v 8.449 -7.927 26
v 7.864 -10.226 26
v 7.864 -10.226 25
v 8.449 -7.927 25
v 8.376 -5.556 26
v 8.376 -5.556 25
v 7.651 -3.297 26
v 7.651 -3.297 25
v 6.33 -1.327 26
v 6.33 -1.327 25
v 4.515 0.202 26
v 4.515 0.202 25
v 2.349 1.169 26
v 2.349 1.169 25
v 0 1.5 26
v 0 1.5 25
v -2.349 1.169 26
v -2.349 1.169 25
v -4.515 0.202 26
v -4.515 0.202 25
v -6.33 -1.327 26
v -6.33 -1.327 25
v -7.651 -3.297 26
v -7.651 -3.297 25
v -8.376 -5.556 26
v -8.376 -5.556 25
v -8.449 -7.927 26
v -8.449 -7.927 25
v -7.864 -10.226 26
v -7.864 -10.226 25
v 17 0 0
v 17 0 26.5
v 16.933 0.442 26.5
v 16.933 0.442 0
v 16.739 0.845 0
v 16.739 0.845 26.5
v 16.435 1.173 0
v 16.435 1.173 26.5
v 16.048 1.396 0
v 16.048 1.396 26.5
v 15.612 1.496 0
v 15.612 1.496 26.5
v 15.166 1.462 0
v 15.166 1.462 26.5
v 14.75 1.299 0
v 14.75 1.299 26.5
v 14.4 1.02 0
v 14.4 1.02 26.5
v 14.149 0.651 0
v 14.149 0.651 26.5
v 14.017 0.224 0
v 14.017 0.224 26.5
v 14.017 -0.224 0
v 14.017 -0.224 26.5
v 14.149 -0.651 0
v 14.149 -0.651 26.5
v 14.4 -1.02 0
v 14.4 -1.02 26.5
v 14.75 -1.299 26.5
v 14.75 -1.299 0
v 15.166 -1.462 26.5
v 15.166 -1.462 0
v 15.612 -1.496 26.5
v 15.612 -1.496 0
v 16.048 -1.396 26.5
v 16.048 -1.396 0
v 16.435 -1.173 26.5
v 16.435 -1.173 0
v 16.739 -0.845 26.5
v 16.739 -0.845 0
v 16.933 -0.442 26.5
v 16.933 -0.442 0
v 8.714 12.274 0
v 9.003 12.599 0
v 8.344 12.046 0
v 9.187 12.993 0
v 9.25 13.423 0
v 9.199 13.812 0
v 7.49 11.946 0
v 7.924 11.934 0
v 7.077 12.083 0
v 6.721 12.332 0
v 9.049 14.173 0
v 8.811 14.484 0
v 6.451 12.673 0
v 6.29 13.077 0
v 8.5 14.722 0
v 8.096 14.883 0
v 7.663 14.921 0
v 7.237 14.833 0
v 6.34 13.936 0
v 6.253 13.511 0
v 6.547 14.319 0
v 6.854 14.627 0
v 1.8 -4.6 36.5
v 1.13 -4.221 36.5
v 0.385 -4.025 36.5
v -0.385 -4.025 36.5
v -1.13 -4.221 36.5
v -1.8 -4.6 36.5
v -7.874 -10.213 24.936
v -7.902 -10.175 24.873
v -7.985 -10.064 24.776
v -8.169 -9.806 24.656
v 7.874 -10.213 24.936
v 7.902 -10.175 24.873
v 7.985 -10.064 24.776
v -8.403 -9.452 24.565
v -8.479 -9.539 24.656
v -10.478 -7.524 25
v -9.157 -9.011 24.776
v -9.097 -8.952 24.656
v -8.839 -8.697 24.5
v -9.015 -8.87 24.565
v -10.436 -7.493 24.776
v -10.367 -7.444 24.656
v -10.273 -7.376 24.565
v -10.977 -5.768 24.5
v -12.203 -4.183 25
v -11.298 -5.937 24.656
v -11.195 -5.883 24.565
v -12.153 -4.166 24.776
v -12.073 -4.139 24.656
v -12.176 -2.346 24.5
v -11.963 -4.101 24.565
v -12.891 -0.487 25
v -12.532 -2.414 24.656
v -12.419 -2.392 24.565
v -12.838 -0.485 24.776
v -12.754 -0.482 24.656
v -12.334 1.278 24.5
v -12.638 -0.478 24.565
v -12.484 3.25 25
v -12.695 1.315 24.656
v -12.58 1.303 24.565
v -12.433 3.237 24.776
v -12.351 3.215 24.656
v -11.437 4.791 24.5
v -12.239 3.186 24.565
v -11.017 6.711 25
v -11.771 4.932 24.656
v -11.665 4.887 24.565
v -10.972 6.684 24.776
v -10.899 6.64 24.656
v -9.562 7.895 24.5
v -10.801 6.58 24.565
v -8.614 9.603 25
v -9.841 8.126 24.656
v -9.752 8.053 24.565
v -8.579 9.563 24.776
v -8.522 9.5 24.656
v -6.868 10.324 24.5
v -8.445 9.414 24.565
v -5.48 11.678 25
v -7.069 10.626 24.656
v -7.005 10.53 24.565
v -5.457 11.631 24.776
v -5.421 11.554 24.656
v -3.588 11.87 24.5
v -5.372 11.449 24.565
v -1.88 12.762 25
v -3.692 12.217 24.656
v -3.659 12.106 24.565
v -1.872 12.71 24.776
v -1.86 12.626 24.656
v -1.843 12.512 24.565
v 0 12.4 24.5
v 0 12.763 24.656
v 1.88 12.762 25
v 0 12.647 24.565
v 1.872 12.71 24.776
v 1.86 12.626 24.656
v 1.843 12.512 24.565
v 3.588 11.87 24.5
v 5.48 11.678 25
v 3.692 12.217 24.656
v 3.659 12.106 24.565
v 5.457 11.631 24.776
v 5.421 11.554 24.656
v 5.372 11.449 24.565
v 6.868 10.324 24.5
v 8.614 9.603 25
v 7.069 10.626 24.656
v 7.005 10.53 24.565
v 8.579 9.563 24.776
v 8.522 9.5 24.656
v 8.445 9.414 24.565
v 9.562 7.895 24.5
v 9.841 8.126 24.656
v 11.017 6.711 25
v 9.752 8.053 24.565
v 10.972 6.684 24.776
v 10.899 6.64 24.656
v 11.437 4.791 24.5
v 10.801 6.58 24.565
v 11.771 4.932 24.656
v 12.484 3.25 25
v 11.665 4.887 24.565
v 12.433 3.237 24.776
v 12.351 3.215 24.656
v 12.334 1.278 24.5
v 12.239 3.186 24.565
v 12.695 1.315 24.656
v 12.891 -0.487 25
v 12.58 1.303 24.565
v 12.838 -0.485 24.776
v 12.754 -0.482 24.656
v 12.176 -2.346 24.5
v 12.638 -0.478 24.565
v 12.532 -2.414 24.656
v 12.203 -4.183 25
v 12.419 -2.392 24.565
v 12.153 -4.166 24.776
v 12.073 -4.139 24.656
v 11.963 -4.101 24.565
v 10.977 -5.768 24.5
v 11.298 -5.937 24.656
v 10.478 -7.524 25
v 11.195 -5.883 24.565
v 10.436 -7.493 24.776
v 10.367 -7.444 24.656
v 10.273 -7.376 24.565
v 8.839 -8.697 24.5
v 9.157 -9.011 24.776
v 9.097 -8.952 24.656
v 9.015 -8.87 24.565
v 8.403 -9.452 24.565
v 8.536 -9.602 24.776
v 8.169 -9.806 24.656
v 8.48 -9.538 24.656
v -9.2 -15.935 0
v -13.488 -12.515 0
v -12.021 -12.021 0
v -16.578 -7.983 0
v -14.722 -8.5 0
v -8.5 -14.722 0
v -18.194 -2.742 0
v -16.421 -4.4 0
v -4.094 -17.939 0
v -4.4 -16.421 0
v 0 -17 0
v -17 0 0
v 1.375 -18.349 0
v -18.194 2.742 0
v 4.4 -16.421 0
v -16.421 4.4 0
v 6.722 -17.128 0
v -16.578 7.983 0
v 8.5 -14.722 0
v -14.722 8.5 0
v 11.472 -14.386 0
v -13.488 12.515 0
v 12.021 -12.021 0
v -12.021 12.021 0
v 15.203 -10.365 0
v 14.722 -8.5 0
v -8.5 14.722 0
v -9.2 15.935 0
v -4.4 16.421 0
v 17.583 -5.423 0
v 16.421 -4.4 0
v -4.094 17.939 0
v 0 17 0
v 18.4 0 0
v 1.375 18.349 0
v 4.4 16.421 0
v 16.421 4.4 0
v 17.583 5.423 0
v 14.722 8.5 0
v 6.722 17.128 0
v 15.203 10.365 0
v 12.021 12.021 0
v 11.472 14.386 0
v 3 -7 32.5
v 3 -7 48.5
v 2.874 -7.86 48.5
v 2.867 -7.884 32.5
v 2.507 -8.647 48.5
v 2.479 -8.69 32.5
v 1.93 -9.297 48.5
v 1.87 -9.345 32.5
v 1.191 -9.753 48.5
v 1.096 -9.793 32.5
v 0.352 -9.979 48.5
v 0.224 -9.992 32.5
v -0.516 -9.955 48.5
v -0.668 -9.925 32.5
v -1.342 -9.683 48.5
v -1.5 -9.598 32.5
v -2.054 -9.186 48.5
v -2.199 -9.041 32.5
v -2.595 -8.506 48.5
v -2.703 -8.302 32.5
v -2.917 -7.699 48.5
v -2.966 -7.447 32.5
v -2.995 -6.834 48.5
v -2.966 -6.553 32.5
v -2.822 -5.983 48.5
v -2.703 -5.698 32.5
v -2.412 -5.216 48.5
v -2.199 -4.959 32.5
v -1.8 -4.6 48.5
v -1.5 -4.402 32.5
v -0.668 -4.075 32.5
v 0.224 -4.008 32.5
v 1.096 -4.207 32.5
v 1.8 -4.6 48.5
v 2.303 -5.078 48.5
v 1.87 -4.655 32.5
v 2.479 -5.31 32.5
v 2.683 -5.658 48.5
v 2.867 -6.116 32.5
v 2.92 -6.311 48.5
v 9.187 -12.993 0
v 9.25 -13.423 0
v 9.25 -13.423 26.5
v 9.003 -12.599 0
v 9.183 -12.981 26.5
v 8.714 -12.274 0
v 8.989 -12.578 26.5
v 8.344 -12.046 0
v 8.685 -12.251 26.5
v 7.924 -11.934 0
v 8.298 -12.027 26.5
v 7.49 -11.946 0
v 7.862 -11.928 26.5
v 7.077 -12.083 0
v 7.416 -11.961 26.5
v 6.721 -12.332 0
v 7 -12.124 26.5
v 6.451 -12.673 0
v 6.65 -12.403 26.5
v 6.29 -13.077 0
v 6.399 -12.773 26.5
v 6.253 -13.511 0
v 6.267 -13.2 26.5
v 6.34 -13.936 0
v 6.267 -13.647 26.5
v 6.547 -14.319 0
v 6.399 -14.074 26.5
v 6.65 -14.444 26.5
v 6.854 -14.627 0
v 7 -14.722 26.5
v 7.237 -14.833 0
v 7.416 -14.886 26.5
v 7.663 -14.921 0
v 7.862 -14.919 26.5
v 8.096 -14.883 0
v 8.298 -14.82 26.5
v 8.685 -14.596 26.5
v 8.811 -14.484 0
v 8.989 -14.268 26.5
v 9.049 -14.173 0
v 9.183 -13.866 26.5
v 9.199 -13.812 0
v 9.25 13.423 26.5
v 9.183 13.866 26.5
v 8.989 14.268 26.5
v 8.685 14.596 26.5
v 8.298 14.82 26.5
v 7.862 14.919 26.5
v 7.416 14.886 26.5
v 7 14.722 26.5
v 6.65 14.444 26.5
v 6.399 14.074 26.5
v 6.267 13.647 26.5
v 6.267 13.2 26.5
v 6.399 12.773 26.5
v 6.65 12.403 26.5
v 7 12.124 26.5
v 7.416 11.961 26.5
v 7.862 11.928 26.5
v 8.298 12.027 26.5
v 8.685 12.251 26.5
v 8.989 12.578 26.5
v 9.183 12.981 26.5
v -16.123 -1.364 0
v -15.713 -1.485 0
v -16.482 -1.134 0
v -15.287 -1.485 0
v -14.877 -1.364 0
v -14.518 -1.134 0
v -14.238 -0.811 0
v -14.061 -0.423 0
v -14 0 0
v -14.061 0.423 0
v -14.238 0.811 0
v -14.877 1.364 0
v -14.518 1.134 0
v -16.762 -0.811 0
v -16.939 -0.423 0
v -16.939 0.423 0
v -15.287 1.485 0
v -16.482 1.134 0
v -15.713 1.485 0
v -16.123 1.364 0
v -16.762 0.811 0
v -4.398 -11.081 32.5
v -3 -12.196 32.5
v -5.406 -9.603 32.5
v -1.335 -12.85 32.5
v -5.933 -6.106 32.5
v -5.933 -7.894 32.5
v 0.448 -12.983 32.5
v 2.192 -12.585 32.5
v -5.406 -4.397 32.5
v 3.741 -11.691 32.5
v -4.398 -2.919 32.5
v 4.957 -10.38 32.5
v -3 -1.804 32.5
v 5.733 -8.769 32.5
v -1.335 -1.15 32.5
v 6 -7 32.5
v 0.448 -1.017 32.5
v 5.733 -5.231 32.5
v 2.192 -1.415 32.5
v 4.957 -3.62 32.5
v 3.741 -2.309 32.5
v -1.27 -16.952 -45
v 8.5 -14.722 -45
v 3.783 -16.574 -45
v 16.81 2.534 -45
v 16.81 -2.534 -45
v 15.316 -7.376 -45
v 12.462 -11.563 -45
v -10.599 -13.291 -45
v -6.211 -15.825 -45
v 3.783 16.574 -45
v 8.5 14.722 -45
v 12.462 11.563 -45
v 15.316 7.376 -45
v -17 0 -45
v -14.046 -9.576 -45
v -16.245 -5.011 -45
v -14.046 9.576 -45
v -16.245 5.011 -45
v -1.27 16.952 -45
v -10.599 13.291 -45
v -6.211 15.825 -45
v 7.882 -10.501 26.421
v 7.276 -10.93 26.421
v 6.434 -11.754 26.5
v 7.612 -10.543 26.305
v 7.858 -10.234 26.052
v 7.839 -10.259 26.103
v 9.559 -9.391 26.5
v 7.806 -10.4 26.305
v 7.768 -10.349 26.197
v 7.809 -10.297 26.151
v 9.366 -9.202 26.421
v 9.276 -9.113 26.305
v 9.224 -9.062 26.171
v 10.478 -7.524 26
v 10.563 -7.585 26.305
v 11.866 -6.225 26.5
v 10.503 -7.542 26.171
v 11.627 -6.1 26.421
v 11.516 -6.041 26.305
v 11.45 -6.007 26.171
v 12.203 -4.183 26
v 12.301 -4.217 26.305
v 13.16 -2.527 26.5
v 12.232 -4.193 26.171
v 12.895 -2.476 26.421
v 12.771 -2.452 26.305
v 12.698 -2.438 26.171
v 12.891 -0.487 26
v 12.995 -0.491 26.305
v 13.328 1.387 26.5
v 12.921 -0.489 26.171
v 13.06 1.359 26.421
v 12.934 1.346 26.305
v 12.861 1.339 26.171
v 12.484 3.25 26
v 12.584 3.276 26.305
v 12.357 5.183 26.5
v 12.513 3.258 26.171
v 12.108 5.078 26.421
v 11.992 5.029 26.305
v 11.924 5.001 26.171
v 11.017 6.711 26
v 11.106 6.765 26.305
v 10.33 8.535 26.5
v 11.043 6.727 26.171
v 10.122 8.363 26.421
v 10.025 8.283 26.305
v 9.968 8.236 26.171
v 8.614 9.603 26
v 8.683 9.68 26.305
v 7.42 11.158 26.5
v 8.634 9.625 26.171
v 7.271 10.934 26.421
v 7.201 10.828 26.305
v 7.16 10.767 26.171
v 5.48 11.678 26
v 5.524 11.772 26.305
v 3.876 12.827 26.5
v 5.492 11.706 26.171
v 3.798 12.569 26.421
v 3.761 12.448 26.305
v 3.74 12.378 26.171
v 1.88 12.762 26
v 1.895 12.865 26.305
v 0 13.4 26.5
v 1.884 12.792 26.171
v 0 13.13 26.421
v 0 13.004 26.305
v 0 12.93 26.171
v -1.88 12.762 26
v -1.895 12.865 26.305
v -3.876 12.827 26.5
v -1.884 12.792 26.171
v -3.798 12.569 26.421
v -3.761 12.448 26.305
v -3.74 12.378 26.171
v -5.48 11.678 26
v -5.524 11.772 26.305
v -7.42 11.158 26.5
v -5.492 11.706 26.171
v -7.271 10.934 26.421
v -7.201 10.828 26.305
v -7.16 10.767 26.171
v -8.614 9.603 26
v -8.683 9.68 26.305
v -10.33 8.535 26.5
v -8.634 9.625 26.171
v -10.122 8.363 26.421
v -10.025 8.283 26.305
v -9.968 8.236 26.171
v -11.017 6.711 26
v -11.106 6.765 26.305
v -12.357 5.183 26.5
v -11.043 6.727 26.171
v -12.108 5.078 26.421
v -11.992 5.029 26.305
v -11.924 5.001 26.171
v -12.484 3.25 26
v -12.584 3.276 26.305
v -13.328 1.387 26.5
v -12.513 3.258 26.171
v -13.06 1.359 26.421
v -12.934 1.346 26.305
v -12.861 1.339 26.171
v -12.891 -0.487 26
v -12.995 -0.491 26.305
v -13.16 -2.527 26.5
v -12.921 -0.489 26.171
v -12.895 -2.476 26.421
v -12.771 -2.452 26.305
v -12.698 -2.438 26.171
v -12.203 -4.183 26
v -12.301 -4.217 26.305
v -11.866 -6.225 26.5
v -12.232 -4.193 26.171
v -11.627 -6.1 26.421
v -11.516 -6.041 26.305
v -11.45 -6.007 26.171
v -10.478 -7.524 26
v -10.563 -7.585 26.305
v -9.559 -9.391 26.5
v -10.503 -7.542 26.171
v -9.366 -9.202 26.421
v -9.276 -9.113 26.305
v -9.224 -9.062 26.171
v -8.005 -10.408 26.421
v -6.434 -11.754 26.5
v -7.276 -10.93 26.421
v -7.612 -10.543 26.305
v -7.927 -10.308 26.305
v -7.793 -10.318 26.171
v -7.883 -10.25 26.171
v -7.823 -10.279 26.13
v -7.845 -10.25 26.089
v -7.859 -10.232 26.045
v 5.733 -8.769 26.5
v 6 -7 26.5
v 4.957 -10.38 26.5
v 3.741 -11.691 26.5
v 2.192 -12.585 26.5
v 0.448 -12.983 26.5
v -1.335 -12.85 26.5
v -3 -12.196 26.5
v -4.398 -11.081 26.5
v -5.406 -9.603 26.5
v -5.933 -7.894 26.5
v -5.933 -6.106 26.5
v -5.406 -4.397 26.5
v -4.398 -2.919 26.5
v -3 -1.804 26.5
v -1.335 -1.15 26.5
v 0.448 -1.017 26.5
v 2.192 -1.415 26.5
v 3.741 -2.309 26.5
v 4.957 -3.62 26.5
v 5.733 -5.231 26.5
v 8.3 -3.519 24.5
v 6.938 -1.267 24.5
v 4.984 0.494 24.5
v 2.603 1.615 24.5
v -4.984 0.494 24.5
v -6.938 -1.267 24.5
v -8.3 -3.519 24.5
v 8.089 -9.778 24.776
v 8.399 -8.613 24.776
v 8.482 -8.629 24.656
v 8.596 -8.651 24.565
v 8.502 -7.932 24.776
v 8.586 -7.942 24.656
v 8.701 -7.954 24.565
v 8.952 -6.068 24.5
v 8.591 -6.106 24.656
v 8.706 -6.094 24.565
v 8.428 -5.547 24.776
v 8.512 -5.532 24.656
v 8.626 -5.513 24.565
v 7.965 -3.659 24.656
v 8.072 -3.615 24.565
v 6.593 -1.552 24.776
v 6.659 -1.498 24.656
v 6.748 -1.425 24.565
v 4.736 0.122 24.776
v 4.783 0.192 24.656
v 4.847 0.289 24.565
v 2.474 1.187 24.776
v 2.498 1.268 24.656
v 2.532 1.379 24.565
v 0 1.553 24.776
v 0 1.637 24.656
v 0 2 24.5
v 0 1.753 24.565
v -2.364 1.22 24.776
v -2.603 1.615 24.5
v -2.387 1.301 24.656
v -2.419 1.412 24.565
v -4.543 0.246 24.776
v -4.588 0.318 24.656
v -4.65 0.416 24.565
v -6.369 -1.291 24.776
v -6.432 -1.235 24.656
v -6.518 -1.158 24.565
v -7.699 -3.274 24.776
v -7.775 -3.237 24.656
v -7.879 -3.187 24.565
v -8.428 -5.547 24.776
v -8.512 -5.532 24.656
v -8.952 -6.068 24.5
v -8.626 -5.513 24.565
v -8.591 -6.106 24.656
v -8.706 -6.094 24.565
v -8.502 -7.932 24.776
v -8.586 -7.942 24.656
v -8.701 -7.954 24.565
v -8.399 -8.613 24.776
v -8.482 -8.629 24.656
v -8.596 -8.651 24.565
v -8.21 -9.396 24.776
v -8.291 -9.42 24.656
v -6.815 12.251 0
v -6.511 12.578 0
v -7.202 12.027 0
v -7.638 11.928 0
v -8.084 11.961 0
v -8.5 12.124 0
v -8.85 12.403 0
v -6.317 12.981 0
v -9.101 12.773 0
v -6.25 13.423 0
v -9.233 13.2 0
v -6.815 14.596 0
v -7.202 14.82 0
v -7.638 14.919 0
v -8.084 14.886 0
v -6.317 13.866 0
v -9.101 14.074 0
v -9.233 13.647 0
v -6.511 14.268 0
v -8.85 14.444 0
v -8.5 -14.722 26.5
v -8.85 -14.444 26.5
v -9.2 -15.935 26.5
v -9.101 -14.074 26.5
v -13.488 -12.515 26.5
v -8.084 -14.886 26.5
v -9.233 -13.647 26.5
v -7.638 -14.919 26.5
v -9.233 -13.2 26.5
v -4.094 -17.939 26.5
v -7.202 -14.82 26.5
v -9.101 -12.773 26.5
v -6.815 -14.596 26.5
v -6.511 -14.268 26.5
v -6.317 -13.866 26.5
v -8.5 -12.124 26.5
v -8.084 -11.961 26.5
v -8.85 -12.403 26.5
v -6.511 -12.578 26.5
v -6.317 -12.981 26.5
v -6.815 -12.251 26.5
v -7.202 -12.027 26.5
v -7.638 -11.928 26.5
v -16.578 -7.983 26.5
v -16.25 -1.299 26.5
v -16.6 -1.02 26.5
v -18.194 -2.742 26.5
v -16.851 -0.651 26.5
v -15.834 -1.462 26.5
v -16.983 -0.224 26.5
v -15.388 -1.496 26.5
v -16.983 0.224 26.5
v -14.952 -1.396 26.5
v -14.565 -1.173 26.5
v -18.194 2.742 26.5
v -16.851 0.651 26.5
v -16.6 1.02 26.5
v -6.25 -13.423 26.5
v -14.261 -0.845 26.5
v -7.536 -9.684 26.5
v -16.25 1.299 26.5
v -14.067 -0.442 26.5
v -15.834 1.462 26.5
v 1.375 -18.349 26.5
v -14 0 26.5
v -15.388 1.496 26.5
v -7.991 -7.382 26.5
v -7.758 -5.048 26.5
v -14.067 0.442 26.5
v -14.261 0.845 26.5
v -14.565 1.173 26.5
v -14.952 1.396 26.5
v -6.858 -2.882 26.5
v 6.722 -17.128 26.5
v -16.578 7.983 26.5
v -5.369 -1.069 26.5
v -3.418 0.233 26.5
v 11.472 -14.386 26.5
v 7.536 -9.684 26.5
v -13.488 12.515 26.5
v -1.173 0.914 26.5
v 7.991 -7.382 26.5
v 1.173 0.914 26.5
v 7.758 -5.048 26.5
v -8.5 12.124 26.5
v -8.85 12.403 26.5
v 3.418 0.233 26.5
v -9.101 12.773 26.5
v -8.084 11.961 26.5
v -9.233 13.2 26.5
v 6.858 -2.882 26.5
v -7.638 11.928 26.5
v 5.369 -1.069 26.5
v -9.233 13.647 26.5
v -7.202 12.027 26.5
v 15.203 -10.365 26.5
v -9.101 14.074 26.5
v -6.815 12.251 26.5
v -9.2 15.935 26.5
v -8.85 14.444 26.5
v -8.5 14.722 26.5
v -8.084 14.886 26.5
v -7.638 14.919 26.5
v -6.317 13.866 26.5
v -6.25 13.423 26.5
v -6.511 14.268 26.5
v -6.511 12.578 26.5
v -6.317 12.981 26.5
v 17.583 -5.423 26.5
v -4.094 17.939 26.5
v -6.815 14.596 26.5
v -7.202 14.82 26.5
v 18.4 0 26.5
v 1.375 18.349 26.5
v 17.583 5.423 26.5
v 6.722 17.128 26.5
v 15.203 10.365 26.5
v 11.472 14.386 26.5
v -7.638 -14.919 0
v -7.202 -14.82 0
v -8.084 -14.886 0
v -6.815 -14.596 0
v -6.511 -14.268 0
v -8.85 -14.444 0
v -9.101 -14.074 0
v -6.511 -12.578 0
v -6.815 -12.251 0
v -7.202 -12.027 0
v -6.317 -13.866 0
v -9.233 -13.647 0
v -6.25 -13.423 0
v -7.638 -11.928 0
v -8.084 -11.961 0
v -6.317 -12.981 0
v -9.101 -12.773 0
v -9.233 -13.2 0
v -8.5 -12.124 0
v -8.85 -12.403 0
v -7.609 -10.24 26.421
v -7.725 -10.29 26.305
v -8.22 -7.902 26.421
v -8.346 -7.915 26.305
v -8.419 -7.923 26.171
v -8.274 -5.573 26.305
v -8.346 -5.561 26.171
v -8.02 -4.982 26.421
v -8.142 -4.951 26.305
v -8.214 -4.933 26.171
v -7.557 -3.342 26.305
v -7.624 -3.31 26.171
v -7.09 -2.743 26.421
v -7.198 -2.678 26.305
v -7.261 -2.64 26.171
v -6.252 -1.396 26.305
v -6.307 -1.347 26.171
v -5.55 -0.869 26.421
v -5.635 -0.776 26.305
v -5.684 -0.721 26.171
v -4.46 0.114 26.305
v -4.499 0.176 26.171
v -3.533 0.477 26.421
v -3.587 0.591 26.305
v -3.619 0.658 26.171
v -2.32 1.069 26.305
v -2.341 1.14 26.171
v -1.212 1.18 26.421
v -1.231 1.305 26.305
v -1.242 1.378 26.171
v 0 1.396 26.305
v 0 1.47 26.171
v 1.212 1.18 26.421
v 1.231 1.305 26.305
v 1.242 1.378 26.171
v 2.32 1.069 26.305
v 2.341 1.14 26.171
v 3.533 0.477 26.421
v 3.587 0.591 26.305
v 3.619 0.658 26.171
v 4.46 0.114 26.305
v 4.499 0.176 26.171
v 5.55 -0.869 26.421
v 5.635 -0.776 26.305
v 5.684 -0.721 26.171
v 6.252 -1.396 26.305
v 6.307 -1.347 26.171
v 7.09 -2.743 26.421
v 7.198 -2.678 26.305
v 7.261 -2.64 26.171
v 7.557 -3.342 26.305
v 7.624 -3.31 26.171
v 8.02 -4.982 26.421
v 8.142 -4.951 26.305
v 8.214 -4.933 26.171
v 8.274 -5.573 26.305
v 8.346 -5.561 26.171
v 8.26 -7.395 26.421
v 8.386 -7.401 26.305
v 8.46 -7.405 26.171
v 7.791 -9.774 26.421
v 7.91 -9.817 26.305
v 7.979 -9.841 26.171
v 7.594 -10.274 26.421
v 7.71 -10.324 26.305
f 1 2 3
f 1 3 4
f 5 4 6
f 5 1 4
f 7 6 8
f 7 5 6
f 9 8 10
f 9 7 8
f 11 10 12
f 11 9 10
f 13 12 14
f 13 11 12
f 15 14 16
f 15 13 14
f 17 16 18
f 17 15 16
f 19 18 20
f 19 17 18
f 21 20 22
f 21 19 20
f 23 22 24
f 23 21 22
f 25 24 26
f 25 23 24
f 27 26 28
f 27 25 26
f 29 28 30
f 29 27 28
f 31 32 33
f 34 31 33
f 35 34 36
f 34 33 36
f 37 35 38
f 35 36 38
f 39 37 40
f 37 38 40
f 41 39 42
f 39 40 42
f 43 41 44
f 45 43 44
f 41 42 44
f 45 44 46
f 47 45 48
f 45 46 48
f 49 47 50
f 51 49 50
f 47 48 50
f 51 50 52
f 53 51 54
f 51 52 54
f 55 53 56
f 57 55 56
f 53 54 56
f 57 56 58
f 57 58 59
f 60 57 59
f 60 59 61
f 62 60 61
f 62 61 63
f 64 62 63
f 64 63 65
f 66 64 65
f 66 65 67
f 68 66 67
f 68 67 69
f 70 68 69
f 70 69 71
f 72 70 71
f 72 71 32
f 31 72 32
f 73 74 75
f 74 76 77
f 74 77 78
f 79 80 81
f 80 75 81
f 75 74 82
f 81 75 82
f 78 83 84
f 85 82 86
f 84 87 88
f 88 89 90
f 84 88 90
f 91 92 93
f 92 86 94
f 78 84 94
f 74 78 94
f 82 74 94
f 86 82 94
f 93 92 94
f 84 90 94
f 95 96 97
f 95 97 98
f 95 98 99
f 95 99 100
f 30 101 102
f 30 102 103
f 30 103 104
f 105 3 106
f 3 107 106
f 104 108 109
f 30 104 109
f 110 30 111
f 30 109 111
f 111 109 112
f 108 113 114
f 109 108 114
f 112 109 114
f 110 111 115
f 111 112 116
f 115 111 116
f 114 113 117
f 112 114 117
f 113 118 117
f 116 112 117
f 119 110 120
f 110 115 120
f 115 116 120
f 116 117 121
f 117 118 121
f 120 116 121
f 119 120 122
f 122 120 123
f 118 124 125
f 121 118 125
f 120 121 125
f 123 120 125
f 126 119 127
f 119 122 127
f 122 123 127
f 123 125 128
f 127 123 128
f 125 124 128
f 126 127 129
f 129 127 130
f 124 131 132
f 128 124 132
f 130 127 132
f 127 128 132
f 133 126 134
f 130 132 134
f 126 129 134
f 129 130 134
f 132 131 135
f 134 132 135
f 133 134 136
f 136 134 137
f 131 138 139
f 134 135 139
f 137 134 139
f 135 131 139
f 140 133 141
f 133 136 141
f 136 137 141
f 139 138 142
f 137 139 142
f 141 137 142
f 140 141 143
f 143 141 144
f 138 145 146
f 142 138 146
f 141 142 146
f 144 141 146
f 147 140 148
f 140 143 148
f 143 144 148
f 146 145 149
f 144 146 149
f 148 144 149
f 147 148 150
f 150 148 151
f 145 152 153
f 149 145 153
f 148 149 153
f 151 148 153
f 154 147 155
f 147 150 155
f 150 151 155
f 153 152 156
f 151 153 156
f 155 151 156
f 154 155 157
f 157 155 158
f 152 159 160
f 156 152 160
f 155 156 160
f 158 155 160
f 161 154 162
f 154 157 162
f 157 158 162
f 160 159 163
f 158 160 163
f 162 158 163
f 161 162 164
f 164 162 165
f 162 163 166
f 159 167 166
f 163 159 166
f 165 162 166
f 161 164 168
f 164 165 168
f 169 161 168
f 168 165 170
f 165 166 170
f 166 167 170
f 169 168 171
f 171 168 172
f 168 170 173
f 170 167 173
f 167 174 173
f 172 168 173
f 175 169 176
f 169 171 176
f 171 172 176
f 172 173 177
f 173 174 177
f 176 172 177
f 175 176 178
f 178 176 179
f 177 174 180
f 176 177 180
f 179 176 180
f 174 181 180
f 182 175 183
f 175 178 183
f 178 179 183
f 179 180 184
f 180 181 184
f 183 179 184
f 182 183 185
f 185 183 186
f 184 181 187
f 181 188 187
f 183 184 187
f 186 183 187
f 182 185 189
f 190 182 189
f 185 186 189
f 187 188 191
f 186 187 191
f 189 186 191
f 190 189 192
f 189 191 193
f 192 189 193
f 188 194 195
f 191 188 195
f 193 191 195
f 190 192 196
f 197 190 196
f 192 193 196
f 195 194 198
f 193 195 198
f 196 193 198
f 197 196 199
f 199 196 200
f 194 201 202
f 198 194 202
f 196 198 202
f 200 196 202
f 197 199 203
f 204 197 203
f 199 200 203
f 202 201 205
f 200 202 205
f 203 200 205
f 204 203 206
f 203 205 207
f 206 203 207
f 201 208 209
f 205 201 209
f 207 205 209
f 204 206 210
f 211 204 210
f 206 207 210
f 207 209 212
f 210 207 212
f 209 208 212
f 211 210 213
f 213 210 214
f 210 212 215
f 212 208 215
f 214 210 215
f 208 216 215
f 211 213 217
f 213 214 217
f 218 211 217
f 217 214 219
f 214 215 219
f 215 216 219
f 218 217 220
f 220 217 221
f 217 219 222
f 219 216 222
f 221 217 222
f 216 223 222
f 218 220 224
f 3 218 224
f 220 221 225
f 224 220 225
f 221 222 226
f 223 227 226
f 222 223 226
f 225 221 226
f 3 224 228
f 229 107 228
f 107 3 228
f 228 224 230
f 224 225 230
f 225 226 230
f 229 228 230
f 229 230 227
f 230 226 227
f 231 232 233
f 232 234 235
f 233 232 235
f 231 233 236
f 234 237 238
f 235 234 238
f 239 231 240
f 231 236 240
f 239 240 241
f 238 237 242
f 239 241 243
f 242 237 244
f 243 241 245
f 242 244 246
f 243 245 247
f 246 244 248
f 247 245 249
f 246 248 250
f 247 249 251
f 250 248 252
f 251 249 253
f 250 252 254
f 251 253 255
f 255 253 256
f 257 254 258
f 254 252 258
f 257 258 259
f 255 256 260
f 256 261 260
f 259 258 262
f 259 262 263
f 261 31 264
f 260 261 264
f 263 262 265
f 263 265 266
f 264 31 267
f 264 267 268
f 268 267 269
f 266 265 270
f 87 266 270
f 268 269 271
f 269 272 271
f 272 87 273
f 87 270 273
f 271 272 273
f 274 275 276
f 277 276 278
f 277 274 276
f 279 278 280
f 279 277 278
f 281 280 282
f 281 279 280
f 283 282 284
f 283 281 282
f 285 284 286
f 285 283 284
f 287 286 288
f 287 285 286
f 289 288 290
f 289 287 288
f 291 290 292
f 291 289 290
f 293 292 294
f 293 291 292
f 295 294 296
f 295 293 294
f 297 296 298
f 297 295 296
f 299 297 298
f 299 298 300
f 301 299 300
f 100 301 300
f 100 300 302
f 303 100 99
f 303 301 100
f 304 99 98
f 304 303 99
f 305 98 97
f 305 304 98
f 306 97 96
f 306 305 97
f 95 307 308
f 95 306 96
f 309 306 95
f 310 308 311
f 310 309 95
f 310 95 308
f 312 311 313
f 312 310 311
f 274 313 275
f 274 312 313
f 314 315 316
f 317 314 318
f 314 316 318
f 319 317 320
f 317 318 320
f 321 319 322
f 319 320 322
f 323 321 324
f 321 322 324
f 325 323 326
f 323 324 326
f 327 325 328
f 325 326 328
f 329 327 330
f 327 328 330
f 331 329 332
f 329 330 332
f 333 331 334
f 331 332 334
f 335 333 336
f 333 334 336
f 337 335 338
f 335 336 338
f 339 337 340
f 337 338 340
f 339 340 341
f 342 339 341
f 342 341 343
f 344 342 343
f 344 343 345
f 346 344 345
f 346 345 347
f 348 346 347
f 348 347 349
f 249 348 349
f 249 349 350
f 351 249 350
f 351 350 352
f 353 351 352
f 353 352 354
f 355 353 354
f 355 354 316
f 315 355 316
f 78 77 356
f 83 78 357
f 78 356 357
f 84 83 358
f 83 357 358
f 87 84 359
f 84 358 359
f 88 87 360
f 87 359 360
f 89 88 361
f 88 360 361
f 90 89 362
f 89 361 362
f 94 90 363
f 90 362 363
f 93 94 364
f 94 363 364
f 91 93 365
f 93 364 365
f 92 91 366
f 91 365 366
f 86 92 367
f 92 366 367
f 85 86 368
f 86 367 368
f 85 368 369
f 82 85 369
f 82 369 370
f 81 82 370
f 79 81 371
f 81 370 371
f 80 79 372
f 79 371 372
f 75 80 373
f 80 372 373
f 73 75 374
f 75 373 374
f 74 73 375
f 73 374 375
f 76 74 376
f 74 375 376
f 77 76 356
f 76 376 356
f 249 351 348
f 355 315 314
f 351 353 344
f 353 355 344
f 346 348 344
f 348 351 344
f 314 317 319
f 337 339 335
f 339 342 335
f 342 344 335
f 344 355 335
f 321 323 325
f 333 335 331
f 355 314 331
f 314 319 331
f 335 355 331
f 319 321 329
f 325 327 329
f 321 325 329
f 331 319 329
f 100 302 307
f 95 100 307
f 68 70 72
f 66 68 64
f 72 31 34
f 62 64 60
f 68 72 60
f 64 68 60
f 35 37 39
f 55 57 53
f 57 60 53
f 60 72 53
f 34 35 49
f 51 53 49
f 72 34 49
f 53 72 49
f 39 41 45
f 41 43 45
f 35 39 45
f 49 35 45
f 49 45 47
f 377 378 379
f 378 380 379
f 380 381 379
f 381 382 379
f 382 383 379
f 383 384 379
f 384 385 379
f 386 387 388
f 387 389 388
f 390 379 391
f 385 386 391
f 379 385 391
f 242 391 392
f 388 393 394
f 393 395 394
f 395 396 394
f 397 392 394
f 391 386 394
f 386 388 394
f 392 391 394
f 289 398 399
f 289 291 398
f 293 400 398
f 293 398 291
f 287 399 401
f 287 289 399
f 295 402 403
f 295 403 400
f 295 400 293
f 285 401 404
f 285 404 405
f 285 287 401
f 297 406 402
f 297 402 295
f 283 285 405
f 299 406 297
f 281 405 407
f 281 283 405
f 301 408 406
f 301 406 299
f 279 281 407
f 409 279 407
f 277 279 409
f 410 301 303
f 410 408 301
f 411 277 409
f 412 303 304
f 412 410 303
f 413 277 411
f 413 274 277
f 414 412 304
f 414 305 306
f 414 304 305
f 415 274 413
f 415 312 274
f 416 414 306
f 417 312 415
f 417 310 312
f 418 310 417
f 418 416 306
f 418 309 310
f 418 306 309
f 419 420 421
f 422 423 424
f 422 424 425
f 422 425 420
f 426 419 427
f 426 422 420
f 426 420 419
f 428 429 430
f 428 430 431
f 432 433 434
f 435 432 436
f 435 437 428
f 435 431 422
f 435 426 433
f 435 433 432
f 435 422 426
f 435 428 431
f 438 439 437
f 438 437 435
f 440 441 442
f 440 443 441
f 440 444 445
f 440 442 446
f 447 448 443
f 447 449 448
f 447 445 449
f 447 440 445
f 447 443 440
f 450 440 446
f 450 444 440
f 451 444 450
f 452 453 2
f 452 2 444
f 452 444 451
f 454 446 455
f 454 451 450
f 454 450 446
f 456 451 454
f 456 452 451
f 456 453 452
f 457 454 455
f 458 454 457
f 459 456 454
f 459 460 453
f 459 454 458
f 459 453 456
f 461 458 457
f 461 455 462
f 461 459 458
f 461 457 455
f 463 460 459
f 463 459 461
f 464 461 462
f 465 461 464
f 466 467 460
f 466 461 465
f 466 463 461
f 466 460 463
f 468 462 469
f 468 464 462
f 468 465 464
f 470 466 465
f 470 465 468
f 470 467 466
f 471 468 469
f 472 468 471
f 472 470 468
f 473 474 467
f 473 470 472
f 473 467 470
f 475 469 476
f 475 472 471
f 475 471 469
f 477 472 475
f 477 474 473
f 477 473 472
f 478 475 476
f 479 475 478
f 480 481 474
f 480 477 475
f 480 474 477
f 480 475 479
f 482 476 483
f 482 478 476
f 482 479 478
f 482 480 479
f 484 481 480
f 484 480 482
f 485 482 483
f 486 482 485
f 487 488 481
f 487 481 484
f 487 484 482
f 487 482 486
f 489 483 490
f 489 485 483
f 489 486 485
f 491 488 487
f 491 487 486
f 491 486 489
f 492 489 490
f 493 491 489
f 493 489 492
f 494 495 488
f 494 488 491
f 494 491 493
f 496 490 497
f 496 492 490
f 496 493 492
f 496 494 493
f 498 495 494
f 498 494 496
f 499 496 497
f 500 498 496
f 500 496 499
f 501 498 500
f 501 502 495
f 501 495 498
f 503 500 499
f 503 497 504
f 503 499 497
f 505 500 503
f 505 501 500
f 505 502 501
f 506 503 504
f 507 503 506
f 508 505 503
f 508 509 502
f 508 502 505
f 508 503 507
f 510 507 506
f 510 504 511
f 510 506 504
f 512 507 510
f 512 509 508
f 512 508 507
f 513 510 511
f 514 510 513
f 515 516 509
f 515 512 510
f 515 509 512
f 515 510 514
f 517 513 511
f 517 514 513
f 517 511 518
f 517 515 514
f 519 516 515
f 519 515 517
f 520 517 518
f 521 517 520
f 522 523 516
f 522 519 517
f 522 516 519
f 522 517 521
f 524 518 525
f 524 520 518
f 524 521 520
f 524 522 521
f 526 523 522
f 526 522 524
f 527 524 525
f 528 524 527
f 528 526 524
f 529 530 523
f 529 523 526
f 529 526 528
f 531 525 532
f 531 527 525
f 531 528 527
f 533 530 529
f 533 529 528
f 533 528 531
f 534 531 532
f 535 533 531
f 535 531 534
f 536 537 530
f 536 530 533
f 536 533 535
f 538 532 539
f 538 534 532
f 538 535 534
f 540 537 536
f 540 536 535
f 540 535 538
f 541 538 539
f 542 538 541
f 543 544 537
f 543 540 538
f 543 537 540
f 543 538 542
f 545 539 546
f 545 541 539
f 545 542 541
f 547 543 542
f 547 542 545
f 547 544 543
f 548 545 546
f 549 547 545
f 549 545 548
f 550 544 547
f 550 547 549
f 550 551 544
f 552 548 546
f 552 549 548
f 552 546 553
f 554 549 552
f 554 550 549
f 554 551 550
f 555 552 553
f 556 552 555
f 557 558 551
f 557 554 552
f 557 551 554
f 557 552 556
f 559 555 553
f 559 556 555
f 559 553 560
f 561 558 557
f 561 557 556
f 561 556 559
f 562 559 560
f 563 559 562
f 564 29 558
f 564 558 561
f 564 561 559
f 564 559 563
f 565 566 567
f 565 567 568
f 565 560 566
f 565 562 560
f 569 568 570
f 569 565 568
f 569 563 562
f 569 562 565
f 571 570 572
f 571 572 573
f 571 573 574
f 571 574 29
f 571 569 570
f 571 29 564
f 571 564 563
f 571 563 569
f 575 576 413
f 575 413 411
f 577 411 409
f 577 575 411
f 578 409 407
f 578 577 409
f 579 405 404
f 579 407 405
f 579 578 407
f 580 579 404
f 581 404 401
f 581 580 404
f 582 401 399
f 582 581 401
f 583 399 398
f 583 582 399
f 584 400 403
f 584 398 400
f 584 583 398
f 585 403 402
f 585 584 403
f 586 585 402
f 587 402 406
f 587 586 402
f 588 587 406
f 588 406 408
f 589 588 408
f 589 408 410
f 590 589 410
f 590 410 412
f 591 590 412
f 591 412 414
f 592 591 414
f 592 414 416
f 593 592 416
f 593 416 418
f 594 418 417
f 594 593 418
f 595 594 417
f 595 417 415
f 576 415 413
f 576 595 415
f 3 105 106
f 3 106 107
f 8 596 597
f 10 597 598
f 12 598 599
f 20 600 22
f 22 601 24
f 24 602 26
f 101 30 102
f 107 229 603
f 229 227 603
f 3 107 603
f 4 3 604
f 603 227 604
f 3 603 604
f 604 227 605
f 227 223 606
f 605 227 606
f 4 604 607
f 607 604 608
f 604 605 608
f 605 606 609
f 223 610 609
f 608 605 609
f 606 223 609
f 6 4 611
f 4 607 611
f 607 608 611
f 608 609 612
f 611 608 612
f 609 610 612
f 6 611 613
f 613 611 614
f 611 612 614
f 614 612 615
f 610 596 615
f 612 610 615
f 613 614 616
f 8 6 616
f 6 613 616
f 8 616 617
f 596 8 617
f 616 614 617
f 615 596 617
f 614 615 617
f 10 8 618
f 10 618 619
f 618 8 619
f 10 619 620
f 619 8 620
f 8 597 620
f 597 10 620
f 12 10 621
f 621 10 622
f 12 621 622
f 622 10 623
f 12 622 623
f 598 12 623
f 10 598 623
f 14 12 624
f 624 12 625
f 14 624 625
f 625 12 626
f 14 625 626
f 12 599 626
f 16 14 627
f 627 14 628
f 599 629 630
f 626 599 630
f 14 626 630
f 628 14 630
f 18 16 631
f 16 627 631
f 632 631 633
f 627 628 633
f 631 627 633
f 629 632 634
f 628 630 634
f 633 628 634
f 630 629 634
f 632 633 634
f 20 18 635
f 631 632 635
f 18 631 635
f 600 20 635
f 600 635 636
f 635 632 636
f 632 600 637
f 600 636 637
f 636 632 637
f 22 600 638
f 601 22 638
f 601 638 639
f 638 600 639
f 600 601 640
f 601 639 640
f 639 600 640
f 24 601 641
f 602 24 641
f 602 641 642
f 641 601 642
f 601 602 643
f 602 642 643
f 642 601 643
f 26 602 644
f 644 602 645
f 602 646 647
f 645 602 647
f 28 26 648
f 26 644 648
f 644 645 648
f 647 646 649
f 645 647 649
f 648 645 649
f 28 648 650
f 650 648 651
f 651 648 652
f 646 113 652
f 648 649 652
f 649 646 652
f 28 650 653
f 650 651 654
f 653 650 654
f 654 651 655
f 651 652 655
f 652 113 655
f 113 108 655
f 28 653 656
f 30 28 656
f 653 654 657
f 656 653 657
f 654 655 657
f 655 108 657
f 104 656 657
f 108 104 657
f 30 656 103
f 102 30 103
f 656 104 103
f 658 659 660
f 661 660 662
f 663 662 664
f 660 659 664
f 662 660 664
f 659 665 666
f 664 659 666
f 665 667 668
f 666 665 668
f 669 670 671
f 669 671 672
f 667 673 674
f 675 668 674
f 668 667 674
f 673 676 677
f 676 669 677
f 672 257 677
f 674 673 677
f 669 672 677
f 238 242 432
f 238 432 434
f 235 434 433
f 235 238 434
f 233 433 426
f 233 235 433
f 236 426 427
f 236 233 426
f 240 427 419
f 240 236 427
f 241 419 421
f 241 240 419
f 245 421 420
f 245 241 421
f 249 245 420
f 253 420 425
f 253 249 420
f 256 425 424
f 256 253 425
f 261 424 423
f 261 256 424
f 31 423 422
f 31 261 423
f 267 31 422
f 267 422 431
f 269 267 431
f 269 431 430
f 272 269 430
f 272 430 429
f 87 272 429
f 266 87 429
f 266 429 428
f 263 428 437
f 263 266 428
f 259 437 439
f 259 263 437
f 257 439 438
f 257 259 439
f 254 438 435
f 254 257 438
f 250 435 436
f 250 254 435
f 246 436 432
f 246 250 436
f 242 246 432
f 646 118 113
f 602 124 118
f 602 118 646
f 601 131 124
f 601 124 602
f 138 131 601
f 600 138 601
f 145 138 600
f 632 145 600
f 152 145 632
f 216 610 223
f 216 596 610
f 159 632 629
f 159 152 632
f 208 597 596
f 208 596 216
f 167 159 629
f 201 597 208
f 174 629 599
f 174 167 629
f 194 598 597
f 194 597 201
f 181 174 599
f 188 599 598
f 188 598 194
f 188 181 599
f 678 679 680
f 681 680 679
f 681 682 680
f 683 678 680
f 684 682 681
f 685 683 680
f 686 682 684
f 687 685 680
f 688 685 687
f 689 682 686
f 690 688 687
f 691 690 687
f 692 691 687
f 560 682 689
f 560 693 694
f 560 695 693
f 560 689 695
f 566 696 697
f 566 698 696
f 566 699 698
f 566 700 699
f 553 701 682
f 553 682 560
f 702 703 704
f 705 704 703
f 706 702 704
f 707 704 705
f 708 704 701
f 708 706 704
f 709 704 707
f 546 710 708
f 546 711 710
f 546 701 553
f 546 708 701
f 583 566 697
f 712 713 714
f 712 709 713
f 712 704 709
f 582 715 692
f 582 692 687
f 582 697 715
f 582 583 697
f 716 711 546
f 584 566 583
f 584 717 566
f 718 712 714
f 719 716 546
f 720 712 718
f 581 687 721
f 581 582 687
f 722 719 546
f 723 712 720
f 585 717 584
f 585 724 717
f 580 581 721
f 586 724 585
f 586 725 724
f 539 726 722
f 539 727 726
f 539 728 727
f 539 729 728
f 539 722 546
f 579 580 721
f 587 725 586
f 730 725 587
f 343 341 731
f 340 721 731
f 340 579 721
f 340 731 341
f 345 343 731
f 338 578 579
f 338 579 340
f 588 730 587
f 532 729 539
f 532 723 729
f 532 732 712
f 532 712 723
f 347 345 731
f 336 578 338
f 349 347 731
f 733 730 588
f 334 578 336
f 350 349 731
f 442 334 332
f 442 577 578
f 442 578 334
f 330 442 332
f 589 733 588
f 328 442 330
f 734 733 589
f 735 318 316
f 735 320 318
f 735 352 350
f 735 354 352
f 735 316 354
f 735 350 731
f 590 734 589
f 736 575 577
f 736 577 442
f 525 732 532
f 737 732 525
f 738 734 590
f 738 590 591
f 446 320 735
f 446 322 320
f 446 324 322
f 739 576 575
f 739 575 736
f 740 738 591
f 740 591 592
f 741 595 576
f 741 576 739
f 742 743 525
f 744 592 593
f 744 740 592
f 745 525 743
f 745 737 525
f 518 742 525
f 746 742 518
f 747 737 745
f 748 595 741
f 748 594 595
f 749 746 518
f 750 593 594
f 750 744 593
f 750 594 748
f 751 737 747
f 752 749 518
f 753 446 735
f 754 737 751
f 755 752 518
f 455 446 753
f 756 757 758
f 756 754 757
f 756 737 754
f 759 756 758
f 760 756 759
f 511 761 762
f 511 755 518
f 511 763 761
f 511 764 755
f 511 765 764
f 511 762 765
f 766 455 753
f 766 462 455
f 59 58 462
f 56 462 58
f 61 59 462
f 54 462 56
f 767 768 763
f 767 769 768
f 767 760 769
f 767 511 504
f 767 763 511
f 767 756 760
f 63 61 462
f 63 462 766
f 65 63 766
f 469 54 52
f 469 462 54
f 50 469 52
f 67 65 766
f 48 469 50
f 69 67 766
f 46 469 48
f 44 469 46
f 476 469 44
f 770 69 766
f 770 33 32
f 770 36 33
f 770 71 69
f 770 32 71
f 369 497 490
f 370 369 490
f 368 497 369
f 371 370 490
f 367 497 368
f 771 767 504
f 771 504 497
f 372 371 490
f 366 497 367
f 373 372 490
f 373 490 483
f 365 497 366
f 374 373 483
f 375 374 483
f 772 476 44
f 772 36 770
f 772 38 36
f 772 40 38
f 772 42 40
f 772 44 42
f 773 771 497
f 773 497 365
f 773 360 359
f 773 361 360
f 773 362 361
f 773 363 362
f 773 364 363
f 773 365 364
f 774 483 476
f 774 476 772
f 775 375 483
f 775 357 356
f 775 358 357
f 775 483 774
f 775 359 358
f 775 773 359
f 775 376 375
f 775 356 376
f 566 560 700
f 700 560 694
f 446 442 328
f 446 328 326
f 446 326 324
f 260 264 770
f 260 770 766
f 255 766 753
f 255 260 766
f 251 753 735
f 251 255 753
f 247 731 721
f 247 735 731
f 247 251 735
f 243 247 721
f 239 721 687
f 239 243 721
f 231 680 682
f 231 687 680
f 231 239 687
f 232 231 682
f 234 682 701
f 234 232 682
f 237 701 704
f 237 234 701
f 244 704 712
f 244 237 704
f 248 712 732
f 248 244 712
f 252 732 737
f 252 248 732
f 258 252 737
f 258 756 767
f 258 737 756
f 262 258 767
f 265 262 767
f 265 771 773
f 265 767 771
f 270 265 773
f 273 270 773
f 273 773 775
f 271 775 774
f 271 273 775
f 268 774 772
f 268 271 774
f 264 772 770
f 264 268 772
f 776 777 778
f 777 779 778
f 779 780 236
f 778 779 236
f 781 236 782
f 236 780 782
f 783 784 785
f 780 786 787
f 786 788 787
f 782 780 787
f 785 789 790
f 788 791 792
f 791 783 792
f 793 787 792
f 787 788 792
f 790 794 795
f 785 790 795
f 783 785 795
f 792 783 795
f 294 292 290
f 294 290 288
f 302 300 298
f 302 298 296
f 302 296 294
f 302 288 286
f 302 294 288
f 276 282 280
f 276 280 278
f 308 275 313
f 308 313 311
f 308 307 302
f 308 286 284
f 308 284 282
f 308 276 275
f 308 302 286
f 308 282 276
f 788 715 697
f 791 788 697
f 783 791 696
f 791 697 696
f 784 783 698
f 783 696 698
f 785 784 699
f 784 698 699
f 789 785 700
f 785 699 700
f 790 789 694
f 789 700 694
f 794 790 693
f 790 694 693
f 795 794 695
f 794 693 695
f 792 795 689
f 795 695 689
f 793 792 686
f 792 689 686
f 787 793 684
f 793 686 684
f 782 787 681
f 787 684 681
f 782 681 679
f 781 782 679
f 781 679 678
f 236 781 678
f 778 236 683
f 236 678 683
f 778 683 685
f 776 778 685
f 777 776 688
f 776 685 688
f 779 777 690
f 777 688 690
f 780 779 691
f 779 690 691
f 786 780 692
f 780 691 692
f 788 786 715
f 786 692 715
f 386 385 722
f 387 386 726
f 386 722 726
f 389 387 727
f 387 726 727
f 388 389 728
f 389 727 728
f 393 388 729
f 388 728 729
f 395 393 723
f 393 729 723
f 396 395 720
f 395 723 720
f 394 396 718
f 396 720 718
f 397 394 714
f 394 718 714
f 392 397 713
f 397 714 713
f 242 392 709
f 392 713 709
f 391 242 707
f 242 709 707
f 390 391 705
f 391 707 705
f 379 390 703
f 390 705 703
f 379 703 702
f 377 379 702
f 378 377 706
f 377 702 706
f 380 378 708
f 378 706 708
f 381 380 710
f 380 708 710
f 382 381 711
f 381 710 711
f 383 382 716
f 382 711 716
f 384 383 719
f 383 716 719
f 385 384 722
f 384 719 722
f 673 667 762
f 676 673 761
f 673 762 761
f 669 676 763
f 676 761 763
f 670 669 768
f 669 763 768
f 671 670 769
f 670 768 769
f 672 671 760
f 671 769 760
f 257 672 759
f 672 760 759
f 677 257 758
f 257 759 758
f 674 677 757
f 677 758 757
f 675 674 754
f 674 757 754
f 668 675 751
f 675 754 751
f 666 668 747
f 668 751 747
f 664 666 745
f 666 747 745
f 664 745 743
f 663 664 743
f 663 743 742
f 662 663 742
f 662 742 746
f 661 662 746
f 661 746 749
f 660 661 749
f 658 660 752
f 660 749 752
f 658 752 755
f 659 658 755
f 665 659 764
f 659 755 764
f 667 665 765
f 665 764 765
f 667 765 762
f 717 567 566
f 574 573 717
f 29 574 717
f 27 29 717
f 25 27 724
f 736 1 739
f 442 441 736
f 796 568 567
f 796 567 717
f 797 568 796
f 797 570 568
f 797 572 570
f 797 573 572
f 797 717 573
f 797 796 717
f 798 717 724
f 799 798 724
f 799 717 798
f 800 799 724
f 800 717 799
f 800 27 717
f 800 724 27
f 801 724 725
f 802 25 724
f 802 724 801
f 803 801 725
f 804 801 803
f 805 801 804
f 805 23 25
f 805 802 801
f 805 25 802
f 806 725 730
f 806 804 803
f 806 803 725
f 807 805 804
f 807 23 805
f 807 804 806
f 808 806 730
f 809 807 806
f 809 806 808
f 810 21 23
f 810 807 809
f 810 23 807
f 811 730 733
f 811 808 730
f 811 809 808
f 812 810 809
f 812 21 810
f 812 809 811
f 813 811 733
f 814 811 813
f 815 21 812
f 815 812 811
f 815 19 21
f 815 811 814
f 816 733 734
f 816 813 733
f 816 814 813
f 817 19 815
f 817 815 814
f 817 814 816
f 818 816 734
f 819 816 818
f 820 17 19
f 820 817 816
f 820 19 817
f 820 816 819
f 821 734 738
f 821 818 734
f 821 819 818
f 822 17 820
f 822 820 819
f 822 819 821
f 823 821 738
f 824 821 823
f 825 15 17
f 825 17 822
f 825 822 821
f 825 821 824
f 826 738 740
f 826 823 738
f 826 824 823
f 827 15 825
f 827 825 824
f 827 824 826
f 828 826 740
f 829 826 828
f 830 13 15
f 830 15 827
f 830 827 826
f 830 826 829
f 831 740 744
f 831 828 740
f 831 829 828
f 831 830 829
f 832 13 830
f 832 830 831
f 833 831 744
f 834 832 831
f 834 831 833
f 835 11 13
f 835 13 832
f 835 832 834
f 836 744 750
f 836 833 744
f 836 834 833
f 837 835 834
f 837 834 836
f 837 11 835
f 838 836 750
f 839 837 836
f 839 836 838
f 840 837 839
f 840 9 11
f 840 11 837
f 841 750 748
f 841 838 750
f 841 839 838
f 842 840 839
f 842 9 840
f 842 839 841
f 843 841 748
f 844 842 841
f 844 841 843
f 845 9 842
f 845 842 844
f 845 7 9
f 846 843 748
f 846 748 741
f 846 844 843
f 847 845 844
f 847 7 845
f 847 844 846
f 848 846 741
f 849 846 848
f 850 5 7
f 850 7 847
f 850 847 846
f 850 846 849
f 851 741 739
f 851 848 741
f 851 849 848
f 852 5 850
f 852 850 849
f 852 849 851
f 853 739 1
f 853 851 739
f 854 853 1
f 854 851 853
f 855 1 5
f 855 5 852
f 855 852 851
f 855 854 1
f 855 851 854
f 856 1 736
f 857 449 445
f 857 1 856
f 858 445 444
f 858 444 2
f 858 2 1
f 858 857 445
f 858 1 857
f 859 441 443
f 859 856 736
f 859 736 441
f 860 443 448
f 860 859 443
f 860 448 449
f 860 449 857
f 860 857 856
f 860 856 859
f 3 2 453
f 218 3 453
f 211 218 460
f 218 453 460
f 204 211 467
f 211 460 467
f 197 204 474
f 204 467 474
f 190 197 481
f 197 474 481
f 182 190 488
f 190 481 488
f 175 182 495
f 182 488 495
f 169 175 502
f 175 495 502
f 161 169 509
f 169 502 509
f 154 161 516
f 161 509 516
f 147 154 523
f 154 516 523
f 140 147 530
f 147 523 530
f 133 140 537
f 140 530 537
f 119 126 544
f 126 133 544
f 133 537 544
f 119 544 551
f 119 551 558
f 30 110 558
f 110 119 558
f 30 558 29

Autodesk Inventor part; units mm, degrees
ref_plane "YZ Plane" through (0, 0, 0) normal (1, 0, 0) x (0, 1, 0)
ref_plane "XZ Plane" through (0, 0, 0) normal (0, 1, 0) x (-1, 0, 0)
ref_plane "XY Plane" through (0, 0, 0) normal (0, 0, 1) x (1, 0, 0)
sketch "Sketch1" plane through (0, 0, 0) normal (0, 0, 1) x (1, 0, 0)
  circle A0 centre (0, 0) radius 18.4
  dimension "d0" = 36.8
extrude "Extrusion1" add sketch "Sketch1" along normal blind 26.5
sketch "Sketch2" plane through (0, 0, 26.5) normal (0, 0, 1) x (1, 0, 0)
  circle A0 centre (0, -7) radius 6
  point P0 (0, 0)
  dimension "d3" = 7
  dimension "d4" = 12
extrude "Extrusion2" add sketch "Sketch2" along normal blind 6
sketch "Sketch3" plane through (0, -7, 32.5) normal (0, 0, 1) x (1, 0, 0)
  circle A0 centre (0, 0) radius 3
  point P0 (0, 7)
  dimension "d7" = 6
extrude "Extrusion3" add sketch "Sketch3" along normal blind 16
sketch "Sketch4" plane through (0, -7, 48.5) normal (0, 0, 1) x (1, 0, 0)
  line L0 (-1.8, 2.4) -> (1.8, 2.4)
  circle A0 centre (0, 0) radius 3 projected
  point P0 (0, 7)
  dimension "d10" = 5.4
extrude "Extrusion4" cut sketch "Sketch4" against normal blind 12 contours A0 L0 picked at (0, 2.6)
sketch "Sketch5" plane through (0, 0, 26.5) normal (0, 0, 1) x (1, 0, 0)
  circle A0 centre (0, 0) radius 18.4 projected
  circle A1 centre (0, 0) radius 12.9
  arc A2 (-1.8, -4.6) -> (1.8, -4.6) centre (0, -7) ccw projected
  circle A3 centre (0, -7) radius 8.5
  point P0 (-7.8641, -10.2257)
  point P1 (7.8641, -10.2257)
  dimension "d13" = 5.5
  dimension "d14" = 17
extrude "Extrusion5" cut sketch "Sketch5" against normal blind 2 contours A1 A3 picked at (-0.0498, 9.0288)
fillet "Fillet1" radius 0.5 4 edges at (0, 12.9, 24.5) (0, 12.9, 26.5) (0, 1.5, 26.5) (0, 1.5, 24.5)
sketch "Sketch6" plane through (0, 0, 26.5) normal (0, 0, 1) x (1, 0, 0)
  circle A0 centre (-15.5, 0) radius 1.5
  circle A1 centre (-7.75, -13.4234) radius 1.5
  circle A2 centre (7.75, -13.4234) radius 1.5
  circle A3 centre (15.5, 0) radius 1.5
  circle A4 centre (7.75, 13.4234) radius 1.5
  circle A5 centre (-7.75, 13.4234) radius 1.5
  point P0 (0, 0)
  point P1 (0, 0)
  dimension "d18" = 3
  dimension "d21" = 360
  dimension "d23" = 31
extrude "Extrusion6" cut sketch "Sketch6" against normal through all
sketch "Sketch7" plane through (0, 0, 0) normal (0, 0, -1) x (-1, 0, 0)
  circle A0 centre (0, 0) radius 18.4
  circle A1 centre (0, 0) radius 18.4 projected
  circle A2 centre (0, 0) radius 17
  dimension "d26" = 34
extrude "Extrusion7" add sketch "Sketch7" along normal blind 45 contours A2
properties part number "37D mm Metal Gearbox Polulu" material "Stainless Steel"
